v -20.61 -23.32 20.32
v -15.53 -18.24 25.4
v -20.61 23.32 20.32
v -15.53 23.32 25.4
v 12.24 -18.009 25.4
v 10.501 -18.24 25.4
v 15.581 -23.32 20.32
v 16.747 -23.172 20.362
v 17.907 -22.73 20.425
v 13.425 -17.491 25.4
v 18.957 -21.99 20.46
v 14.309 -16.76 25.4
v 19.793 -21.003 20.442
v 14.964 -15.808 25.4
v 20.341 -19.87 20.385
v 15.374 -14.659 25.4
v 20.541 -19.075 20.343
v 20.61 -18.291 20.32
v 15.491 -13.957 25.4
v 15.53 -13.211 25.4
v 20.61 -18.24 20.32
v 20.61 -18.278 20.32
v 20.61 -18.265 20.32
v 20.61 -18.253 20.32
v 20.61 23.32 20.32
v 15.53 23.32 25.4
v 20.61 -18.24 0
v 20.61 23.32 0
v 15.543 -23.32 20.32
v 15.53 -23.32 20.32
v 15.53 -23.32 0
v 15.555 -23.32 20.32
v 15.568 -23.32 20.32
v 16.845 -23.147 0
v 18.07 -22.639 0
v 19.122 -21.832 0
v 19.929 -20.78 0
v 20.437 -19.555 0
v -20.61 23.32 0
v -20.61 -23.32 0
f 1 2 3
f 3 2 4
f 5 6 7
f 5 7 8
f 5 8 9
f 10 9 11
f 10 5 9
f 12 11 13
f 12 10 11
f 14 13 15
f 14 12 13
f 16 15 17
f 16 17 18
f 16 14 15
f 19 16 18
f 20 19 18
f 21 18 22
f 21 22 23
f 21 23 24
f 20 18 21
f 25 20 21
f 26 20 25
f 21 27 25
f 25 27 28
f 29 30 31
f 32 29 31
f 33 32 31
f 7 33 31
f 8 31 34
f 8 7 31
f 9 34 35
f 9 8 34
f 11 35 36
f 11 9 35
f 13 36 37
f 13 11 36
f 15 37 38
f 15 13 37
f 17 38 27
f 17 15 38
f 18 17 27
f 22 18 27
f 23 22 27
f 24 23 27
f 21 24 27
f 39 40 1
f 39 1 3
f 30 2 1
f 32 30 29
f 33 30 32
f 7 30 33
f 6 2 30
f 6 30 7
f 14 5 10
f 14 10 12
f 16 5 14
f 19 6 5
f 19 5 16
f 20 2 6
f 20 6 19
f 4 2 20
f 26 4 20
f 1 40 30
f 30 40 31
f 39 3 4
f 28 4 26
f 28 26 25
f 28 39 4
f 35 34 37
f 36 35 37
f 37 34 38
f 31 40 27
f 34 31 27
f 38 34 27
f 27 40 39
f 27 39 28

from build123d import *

# Parameters (mm, degrees)
F0_W     = 41.2199348211
F0_H     = 46.6398596764
F1_DEPTH = 25.4
F2_SIZE  = 5.08
F3_R     = 7.112
F4_R     = 5.08


with BuildPart() as f1:
    # F0 (on Top) → F1 (new body)
    with BuildSketch(Plane.XY):
        Rectangle(F0_W, F0_H)
    extrude(amount=F1_DEPTH)

    # F2
    f2_edges = [f1.edges().sort_by_distance(p)[0] for p in [
        (20.609967, 0, 25.4),
        (-20.609967, 0, 25.4),
        (0, -23.31993, 25.4),
    ]]
    chamfer(f2_edges, length=F2_SIZE)

    # F3
    f3_edges = [f1.edges().sort_by_distance(p)[0] for p in [
        (18.069967, -20.77993, 22.86),
    ]]
    fillet(f3_edges, radius=F3_R)

    # F4
    f4_edges = [f1.edges().sort_by_distance(p)[0] for p in [
        (20.609967, -23.31993, 9.486249),
    ]]
    fillet(f4_edges, radius=F4_R)


solid = f1.part
